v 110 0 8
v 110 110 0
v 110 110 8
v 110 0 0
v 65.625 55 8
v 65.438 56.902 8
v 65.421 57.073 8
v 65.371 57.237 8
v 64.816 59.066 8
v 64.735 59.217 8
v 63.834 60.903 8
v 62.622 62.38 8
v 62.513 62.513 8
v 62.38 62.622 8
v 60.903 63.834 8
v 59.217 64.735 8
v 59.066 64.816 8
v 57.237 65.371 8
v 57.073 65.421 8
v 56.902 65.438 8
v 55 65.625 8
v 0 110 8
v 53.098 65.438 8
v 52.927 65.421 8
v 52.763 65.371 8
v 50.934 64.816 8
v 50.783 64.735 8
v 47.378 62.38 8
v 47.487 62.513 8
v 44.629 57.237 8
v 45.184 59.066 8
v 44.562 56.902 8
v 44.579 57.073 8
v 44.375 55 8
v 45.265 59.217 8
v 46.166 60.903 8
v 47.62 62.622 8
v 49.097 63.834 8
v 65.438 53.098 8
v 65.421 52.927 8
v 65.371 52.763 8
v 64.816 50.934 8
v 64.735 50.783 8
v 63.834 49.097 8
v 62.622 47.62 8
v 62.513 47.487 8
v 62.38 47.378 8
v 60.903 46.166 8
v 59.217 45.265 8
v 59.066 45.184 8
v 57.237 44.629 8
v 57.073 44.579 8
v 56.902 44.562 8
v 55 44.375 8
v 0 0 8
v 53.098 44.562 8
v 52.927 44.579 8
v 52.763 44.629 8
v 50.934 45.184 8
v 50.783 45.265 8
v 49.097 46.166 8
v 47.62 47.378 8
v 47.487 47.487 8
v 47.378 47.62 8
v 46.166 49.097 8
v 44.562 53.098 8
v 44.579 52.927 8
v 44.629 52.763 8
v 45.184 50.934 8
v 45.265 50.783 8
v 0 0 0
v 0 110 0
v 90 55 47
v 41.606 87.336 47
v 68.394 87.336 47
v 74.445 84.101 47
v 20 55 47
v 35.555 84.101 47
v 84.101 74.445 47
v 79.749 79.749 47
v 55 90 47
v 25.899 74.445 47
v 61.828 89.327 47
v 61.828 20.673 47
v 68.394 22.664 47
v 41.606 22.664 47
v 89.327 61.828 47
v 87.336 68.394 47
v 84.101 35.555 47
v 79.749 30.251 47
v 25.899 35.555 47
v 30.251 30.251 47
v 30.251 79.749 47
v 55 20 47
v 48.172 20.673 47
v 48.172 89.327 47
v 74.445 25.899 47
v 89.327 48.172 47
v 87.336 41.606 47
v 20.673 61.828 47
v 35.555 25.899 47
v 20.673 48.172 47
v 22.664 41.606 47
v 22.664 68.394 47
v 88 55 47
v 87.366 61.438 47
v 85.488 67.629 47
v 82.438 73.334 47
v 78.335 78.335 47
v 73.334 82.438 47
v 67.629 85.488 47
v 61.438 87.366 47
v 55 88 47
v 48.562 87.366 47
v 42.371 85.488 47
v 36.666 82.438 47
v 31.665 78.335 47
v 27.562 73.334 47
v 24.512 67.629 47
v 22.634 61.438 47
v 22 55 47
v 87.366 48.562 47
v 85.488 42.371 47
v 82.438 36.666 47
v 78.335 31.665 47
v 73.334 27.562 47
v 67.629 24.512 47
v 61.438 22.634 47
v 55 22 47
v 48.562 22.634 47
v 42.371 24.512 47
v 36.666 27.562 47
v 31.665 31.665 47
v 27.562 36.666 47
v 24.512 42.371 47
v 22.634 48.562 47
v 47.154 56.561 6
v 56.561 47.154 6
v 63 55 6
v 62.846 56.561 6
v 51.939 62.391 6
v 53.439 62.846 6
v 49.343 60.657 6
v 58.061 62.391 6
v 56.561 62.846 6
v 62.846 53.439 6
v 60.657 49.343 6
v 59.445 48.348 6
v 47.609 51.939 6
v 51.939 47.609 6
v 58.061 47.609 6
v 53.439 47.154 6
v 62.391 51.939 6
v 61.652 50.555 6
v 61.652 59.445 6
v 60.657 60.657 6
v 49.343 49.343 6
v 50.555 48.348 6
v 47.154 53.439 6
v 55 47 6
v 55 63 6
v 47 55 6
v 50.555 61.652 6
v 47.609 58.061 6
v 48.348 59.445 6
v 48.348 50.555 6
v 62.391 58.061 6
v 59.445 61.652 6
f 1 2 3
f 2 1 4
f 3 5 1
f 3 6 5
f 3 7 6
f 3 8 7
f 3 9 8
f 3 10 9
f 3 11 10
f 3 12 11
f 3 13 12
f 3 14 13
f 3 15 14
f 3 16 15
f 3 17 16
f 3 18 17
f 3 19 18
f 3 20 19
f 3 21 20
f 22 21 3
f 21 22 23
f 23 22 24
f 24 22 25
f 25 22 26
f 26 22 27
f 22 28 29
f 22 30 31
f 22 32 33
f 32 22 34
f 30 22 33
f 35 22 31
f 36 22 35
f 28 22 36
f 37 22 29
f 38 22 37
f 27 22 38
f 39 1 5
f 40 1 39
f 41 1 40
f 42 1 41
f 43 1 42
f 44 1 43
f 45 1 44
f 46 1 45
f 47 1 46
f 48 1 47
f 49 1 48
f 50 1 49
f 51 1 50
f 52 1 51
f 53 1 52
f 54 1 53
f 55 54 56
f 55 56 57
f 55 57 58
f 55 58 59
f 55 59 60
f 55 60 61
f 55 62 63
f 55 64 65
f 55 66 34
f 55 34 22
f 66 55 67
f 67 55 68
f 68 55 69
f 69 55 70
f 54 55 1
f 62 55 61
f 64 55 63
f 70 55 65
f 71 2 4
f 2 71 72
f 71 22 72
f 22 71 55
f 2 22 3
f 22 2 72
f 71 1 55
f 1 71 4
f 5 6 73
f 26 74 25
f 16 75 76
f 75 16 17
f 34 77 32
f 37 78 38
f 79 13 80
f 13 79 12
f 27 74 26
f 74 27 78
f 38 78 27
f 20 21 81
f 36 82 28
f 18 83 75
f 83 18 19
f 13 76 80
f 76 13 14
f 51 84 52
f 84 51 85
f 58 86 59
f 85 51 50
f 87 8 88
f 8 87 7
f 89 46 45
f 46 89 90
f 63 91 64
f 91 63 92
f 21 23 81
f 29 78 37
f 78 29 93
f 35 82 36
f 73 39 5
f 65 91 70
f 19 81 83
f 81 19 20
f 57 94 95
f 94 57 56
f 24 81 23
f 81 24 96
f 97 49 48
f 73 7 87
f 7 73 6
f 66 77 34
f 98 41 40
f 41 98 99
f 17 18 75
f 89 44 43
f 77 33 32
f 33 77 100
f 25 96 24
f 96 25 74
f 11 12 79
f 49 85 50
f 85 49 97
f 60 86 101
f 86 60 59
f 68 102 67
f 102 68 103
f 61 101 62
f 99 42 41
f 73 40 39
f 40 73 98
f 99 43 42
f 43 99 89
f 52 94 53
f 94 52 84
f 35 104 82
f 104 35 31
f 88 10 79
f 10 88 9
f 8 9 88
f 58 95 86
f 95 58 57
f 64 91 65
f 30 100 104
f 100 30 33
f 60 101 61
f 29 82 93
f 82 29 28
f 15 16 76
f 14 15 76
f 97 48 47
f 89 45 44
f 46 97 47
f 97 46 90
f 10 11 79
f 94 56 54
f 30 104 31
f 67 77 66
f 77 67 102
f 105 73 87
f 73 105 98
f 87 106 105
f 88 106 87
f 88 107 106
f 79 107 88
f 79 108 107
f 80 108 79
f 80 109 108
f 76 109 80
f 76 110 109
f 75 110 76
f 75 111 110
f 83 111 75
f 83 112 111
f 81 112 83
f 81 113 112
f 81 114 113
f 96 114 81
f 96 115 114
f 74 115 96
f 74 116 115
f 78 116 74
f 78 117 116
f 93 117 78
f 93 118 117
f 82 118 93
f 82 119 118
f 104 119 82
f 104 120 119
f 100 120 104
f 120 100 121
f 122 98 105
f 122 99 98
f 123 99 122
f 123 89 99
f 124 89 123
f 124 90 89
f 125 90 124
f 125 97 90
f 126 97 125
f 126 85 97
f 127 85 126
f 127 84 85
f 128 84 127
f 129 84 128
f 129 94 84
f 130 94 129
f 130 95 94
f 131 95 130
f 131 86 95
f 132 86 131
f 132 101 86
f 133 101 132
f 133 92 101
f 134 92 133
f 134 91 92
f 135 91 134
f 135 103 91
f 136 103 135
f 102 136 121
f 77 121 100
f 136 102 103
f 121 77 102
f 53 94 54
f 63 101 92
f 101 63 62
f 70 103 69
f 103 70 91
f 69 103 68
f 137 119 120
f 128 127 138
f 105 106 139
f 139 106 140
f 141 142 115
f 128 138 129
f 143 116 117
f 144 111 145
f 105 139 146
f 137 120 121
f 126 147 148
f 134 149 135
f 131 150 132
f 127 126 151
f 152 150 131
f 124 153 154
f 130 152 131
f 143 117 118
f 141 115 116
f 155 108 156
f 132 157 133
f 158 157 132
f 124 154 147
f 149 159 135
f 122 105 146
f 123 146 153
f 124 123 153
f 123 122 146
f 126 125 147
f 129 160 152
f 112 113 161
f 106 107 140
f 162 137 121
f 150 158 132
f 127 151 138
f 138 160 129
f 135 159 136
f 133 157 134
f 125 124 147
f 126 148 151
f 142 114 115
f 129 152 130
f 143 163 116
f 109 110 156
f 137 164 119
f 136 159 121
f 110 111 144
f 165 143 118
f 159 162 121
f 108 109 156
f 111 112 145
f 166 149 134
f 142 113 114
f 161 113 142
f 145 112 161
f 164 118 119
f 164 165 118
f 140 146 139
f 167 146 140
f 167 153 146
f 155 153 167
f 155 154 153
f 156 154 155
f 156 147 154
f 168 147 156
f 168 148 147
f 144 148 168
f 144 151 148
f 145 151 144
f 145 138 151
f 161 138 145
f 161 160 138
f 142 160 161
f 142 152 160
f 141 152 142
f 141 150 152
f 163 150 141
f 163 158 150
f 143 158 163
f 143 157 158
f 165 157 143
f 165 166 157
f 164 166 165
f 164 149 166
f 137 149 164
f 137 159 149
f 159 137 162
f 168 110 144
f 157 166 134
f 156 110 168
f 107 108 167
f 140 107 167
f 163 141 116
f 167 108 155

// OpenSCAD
$fn = 32;

// ----------------------------------------------------------------------
// Hopper: funnel with square flange
// ----------------------------------------------------------------------

// --- parameters (mm) ---
fl = 110;                 // flange side, X and Y
fl_t = 8;                 // flange thickness
cone_h = 40;              // cone height above the flange
top_d = 70;               // cone mouth diameter
bot_d = 20;               // cone spout diameter
wall = 2;                 // cone wall thickness
fit_tol = 0.05;           // tolerance for press fits, mm
free_tol = 0.2;           // tolerance for clearance fits, mm

bore_d = bot_d - 2 * wall;  // spout bore diameter
total_h = fl_t + cone_h - 1;  // overall height

difference() {
  union() {
    cube([fl, fl, fl_t]);
    translate([fl / 2, fl / 2, fl_t - 1])
      cylinder(h = cone_h, d1 = bot_d, d2 = top_d);
  }
  translate([fl / 2, fl / 2, fl_t - 2])
    cylinder(h = cone_h + 1, d1 = bore_d, d2 = top_d - 2 * wall);
}
